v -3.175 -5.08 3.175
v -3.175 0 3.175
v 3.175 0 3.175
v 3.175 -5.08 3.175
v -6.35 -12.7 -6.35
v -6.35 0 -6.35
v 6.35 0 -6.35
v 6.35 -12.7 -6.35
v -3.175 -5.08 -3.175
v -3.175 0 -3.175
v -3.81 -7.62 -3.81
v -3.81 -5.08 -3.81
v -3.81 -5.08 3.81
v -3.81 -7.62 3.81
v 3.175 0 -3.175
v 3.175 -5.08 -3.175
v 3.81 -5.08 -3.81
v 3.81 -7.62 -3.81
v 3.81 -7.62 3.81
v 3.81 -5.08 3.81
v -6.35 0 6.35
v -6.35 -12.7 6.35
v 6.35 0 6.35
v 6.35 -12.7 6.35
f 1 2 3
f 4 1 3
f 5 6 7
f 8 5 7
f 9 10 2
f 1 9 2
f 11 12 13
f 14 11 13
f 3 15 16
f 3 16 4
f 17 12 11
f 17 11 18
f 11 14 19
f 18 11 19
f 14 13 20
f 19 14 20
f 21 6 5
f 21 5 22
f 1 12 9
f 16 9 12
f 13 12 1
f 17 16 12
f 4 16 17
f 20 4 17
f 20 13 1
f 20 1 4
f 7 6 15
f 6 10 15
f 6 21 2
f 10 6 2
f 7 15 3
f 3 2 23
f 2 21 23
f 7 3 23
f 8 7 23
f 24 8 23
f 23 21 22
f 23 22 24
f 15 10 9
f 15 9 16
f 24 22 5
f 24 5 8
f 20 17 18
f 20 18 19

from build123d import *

# Parameters (mm, degrees)
F0_W     = 12.7
F0_H     = 12.7
F0_W_2   = 7.62
F0_H_2   = 7.62
F0_W_3   = 6.35
F0_H_3   = 6.35
F1_DEPTH = 12.7
F2_DEPTH = 7.62
F3_DEPTH = 7.62
F4_DEPTH = 5.08


with BuildPart() as f1:
    # F0 (on Front) → F1 (new body)
    with BuildSketch(Plane.XZ):
        Rectangle(F0_W, F0_H)
        Rectangle(F0_W_2, F0_H_2, mode=Mode.SUBTRACT)
        Rectangle(F0_W_2, F0_H_2)
        Rectangle(F0_W_3, F0_H_3, mode=Mode.SUBTRACT)
        Rectangle(F0_W_3, F0_H_3)
    extrude(amount=F1_DEPTH)

    # F0 (on Front) → F2 (cut)
    with BuildSketch(Plane.XZ):
        Rectangle(F0_W_3, F0_H_3)
    extrude(amount=F2_DEPTH, mode=Mode.SUBTRACT)

    # F0 (on Front) → F3 (cut)
    with BuildSketch(Plane.XZ):
        Rectangle(F0_W_2, F0_H_2)
        Rectangle(F0_W_3, F0_H_3, mode=Mode.SUBTRACT)
    extrude(amount=F3_DEPTH, mode=Mode.SUBTRACT)

    # F0 (on Front) → F4 (join)
    with BuildSketch(Plane.XZ):
        Rectangle(F0_W_2, F0_H_2)
        Rectangle(F0_W_3, F0_H_3, mode=Mode.SUBTRACT)
    extrude(amount=F4_DEPTH)


solid = f1.part
